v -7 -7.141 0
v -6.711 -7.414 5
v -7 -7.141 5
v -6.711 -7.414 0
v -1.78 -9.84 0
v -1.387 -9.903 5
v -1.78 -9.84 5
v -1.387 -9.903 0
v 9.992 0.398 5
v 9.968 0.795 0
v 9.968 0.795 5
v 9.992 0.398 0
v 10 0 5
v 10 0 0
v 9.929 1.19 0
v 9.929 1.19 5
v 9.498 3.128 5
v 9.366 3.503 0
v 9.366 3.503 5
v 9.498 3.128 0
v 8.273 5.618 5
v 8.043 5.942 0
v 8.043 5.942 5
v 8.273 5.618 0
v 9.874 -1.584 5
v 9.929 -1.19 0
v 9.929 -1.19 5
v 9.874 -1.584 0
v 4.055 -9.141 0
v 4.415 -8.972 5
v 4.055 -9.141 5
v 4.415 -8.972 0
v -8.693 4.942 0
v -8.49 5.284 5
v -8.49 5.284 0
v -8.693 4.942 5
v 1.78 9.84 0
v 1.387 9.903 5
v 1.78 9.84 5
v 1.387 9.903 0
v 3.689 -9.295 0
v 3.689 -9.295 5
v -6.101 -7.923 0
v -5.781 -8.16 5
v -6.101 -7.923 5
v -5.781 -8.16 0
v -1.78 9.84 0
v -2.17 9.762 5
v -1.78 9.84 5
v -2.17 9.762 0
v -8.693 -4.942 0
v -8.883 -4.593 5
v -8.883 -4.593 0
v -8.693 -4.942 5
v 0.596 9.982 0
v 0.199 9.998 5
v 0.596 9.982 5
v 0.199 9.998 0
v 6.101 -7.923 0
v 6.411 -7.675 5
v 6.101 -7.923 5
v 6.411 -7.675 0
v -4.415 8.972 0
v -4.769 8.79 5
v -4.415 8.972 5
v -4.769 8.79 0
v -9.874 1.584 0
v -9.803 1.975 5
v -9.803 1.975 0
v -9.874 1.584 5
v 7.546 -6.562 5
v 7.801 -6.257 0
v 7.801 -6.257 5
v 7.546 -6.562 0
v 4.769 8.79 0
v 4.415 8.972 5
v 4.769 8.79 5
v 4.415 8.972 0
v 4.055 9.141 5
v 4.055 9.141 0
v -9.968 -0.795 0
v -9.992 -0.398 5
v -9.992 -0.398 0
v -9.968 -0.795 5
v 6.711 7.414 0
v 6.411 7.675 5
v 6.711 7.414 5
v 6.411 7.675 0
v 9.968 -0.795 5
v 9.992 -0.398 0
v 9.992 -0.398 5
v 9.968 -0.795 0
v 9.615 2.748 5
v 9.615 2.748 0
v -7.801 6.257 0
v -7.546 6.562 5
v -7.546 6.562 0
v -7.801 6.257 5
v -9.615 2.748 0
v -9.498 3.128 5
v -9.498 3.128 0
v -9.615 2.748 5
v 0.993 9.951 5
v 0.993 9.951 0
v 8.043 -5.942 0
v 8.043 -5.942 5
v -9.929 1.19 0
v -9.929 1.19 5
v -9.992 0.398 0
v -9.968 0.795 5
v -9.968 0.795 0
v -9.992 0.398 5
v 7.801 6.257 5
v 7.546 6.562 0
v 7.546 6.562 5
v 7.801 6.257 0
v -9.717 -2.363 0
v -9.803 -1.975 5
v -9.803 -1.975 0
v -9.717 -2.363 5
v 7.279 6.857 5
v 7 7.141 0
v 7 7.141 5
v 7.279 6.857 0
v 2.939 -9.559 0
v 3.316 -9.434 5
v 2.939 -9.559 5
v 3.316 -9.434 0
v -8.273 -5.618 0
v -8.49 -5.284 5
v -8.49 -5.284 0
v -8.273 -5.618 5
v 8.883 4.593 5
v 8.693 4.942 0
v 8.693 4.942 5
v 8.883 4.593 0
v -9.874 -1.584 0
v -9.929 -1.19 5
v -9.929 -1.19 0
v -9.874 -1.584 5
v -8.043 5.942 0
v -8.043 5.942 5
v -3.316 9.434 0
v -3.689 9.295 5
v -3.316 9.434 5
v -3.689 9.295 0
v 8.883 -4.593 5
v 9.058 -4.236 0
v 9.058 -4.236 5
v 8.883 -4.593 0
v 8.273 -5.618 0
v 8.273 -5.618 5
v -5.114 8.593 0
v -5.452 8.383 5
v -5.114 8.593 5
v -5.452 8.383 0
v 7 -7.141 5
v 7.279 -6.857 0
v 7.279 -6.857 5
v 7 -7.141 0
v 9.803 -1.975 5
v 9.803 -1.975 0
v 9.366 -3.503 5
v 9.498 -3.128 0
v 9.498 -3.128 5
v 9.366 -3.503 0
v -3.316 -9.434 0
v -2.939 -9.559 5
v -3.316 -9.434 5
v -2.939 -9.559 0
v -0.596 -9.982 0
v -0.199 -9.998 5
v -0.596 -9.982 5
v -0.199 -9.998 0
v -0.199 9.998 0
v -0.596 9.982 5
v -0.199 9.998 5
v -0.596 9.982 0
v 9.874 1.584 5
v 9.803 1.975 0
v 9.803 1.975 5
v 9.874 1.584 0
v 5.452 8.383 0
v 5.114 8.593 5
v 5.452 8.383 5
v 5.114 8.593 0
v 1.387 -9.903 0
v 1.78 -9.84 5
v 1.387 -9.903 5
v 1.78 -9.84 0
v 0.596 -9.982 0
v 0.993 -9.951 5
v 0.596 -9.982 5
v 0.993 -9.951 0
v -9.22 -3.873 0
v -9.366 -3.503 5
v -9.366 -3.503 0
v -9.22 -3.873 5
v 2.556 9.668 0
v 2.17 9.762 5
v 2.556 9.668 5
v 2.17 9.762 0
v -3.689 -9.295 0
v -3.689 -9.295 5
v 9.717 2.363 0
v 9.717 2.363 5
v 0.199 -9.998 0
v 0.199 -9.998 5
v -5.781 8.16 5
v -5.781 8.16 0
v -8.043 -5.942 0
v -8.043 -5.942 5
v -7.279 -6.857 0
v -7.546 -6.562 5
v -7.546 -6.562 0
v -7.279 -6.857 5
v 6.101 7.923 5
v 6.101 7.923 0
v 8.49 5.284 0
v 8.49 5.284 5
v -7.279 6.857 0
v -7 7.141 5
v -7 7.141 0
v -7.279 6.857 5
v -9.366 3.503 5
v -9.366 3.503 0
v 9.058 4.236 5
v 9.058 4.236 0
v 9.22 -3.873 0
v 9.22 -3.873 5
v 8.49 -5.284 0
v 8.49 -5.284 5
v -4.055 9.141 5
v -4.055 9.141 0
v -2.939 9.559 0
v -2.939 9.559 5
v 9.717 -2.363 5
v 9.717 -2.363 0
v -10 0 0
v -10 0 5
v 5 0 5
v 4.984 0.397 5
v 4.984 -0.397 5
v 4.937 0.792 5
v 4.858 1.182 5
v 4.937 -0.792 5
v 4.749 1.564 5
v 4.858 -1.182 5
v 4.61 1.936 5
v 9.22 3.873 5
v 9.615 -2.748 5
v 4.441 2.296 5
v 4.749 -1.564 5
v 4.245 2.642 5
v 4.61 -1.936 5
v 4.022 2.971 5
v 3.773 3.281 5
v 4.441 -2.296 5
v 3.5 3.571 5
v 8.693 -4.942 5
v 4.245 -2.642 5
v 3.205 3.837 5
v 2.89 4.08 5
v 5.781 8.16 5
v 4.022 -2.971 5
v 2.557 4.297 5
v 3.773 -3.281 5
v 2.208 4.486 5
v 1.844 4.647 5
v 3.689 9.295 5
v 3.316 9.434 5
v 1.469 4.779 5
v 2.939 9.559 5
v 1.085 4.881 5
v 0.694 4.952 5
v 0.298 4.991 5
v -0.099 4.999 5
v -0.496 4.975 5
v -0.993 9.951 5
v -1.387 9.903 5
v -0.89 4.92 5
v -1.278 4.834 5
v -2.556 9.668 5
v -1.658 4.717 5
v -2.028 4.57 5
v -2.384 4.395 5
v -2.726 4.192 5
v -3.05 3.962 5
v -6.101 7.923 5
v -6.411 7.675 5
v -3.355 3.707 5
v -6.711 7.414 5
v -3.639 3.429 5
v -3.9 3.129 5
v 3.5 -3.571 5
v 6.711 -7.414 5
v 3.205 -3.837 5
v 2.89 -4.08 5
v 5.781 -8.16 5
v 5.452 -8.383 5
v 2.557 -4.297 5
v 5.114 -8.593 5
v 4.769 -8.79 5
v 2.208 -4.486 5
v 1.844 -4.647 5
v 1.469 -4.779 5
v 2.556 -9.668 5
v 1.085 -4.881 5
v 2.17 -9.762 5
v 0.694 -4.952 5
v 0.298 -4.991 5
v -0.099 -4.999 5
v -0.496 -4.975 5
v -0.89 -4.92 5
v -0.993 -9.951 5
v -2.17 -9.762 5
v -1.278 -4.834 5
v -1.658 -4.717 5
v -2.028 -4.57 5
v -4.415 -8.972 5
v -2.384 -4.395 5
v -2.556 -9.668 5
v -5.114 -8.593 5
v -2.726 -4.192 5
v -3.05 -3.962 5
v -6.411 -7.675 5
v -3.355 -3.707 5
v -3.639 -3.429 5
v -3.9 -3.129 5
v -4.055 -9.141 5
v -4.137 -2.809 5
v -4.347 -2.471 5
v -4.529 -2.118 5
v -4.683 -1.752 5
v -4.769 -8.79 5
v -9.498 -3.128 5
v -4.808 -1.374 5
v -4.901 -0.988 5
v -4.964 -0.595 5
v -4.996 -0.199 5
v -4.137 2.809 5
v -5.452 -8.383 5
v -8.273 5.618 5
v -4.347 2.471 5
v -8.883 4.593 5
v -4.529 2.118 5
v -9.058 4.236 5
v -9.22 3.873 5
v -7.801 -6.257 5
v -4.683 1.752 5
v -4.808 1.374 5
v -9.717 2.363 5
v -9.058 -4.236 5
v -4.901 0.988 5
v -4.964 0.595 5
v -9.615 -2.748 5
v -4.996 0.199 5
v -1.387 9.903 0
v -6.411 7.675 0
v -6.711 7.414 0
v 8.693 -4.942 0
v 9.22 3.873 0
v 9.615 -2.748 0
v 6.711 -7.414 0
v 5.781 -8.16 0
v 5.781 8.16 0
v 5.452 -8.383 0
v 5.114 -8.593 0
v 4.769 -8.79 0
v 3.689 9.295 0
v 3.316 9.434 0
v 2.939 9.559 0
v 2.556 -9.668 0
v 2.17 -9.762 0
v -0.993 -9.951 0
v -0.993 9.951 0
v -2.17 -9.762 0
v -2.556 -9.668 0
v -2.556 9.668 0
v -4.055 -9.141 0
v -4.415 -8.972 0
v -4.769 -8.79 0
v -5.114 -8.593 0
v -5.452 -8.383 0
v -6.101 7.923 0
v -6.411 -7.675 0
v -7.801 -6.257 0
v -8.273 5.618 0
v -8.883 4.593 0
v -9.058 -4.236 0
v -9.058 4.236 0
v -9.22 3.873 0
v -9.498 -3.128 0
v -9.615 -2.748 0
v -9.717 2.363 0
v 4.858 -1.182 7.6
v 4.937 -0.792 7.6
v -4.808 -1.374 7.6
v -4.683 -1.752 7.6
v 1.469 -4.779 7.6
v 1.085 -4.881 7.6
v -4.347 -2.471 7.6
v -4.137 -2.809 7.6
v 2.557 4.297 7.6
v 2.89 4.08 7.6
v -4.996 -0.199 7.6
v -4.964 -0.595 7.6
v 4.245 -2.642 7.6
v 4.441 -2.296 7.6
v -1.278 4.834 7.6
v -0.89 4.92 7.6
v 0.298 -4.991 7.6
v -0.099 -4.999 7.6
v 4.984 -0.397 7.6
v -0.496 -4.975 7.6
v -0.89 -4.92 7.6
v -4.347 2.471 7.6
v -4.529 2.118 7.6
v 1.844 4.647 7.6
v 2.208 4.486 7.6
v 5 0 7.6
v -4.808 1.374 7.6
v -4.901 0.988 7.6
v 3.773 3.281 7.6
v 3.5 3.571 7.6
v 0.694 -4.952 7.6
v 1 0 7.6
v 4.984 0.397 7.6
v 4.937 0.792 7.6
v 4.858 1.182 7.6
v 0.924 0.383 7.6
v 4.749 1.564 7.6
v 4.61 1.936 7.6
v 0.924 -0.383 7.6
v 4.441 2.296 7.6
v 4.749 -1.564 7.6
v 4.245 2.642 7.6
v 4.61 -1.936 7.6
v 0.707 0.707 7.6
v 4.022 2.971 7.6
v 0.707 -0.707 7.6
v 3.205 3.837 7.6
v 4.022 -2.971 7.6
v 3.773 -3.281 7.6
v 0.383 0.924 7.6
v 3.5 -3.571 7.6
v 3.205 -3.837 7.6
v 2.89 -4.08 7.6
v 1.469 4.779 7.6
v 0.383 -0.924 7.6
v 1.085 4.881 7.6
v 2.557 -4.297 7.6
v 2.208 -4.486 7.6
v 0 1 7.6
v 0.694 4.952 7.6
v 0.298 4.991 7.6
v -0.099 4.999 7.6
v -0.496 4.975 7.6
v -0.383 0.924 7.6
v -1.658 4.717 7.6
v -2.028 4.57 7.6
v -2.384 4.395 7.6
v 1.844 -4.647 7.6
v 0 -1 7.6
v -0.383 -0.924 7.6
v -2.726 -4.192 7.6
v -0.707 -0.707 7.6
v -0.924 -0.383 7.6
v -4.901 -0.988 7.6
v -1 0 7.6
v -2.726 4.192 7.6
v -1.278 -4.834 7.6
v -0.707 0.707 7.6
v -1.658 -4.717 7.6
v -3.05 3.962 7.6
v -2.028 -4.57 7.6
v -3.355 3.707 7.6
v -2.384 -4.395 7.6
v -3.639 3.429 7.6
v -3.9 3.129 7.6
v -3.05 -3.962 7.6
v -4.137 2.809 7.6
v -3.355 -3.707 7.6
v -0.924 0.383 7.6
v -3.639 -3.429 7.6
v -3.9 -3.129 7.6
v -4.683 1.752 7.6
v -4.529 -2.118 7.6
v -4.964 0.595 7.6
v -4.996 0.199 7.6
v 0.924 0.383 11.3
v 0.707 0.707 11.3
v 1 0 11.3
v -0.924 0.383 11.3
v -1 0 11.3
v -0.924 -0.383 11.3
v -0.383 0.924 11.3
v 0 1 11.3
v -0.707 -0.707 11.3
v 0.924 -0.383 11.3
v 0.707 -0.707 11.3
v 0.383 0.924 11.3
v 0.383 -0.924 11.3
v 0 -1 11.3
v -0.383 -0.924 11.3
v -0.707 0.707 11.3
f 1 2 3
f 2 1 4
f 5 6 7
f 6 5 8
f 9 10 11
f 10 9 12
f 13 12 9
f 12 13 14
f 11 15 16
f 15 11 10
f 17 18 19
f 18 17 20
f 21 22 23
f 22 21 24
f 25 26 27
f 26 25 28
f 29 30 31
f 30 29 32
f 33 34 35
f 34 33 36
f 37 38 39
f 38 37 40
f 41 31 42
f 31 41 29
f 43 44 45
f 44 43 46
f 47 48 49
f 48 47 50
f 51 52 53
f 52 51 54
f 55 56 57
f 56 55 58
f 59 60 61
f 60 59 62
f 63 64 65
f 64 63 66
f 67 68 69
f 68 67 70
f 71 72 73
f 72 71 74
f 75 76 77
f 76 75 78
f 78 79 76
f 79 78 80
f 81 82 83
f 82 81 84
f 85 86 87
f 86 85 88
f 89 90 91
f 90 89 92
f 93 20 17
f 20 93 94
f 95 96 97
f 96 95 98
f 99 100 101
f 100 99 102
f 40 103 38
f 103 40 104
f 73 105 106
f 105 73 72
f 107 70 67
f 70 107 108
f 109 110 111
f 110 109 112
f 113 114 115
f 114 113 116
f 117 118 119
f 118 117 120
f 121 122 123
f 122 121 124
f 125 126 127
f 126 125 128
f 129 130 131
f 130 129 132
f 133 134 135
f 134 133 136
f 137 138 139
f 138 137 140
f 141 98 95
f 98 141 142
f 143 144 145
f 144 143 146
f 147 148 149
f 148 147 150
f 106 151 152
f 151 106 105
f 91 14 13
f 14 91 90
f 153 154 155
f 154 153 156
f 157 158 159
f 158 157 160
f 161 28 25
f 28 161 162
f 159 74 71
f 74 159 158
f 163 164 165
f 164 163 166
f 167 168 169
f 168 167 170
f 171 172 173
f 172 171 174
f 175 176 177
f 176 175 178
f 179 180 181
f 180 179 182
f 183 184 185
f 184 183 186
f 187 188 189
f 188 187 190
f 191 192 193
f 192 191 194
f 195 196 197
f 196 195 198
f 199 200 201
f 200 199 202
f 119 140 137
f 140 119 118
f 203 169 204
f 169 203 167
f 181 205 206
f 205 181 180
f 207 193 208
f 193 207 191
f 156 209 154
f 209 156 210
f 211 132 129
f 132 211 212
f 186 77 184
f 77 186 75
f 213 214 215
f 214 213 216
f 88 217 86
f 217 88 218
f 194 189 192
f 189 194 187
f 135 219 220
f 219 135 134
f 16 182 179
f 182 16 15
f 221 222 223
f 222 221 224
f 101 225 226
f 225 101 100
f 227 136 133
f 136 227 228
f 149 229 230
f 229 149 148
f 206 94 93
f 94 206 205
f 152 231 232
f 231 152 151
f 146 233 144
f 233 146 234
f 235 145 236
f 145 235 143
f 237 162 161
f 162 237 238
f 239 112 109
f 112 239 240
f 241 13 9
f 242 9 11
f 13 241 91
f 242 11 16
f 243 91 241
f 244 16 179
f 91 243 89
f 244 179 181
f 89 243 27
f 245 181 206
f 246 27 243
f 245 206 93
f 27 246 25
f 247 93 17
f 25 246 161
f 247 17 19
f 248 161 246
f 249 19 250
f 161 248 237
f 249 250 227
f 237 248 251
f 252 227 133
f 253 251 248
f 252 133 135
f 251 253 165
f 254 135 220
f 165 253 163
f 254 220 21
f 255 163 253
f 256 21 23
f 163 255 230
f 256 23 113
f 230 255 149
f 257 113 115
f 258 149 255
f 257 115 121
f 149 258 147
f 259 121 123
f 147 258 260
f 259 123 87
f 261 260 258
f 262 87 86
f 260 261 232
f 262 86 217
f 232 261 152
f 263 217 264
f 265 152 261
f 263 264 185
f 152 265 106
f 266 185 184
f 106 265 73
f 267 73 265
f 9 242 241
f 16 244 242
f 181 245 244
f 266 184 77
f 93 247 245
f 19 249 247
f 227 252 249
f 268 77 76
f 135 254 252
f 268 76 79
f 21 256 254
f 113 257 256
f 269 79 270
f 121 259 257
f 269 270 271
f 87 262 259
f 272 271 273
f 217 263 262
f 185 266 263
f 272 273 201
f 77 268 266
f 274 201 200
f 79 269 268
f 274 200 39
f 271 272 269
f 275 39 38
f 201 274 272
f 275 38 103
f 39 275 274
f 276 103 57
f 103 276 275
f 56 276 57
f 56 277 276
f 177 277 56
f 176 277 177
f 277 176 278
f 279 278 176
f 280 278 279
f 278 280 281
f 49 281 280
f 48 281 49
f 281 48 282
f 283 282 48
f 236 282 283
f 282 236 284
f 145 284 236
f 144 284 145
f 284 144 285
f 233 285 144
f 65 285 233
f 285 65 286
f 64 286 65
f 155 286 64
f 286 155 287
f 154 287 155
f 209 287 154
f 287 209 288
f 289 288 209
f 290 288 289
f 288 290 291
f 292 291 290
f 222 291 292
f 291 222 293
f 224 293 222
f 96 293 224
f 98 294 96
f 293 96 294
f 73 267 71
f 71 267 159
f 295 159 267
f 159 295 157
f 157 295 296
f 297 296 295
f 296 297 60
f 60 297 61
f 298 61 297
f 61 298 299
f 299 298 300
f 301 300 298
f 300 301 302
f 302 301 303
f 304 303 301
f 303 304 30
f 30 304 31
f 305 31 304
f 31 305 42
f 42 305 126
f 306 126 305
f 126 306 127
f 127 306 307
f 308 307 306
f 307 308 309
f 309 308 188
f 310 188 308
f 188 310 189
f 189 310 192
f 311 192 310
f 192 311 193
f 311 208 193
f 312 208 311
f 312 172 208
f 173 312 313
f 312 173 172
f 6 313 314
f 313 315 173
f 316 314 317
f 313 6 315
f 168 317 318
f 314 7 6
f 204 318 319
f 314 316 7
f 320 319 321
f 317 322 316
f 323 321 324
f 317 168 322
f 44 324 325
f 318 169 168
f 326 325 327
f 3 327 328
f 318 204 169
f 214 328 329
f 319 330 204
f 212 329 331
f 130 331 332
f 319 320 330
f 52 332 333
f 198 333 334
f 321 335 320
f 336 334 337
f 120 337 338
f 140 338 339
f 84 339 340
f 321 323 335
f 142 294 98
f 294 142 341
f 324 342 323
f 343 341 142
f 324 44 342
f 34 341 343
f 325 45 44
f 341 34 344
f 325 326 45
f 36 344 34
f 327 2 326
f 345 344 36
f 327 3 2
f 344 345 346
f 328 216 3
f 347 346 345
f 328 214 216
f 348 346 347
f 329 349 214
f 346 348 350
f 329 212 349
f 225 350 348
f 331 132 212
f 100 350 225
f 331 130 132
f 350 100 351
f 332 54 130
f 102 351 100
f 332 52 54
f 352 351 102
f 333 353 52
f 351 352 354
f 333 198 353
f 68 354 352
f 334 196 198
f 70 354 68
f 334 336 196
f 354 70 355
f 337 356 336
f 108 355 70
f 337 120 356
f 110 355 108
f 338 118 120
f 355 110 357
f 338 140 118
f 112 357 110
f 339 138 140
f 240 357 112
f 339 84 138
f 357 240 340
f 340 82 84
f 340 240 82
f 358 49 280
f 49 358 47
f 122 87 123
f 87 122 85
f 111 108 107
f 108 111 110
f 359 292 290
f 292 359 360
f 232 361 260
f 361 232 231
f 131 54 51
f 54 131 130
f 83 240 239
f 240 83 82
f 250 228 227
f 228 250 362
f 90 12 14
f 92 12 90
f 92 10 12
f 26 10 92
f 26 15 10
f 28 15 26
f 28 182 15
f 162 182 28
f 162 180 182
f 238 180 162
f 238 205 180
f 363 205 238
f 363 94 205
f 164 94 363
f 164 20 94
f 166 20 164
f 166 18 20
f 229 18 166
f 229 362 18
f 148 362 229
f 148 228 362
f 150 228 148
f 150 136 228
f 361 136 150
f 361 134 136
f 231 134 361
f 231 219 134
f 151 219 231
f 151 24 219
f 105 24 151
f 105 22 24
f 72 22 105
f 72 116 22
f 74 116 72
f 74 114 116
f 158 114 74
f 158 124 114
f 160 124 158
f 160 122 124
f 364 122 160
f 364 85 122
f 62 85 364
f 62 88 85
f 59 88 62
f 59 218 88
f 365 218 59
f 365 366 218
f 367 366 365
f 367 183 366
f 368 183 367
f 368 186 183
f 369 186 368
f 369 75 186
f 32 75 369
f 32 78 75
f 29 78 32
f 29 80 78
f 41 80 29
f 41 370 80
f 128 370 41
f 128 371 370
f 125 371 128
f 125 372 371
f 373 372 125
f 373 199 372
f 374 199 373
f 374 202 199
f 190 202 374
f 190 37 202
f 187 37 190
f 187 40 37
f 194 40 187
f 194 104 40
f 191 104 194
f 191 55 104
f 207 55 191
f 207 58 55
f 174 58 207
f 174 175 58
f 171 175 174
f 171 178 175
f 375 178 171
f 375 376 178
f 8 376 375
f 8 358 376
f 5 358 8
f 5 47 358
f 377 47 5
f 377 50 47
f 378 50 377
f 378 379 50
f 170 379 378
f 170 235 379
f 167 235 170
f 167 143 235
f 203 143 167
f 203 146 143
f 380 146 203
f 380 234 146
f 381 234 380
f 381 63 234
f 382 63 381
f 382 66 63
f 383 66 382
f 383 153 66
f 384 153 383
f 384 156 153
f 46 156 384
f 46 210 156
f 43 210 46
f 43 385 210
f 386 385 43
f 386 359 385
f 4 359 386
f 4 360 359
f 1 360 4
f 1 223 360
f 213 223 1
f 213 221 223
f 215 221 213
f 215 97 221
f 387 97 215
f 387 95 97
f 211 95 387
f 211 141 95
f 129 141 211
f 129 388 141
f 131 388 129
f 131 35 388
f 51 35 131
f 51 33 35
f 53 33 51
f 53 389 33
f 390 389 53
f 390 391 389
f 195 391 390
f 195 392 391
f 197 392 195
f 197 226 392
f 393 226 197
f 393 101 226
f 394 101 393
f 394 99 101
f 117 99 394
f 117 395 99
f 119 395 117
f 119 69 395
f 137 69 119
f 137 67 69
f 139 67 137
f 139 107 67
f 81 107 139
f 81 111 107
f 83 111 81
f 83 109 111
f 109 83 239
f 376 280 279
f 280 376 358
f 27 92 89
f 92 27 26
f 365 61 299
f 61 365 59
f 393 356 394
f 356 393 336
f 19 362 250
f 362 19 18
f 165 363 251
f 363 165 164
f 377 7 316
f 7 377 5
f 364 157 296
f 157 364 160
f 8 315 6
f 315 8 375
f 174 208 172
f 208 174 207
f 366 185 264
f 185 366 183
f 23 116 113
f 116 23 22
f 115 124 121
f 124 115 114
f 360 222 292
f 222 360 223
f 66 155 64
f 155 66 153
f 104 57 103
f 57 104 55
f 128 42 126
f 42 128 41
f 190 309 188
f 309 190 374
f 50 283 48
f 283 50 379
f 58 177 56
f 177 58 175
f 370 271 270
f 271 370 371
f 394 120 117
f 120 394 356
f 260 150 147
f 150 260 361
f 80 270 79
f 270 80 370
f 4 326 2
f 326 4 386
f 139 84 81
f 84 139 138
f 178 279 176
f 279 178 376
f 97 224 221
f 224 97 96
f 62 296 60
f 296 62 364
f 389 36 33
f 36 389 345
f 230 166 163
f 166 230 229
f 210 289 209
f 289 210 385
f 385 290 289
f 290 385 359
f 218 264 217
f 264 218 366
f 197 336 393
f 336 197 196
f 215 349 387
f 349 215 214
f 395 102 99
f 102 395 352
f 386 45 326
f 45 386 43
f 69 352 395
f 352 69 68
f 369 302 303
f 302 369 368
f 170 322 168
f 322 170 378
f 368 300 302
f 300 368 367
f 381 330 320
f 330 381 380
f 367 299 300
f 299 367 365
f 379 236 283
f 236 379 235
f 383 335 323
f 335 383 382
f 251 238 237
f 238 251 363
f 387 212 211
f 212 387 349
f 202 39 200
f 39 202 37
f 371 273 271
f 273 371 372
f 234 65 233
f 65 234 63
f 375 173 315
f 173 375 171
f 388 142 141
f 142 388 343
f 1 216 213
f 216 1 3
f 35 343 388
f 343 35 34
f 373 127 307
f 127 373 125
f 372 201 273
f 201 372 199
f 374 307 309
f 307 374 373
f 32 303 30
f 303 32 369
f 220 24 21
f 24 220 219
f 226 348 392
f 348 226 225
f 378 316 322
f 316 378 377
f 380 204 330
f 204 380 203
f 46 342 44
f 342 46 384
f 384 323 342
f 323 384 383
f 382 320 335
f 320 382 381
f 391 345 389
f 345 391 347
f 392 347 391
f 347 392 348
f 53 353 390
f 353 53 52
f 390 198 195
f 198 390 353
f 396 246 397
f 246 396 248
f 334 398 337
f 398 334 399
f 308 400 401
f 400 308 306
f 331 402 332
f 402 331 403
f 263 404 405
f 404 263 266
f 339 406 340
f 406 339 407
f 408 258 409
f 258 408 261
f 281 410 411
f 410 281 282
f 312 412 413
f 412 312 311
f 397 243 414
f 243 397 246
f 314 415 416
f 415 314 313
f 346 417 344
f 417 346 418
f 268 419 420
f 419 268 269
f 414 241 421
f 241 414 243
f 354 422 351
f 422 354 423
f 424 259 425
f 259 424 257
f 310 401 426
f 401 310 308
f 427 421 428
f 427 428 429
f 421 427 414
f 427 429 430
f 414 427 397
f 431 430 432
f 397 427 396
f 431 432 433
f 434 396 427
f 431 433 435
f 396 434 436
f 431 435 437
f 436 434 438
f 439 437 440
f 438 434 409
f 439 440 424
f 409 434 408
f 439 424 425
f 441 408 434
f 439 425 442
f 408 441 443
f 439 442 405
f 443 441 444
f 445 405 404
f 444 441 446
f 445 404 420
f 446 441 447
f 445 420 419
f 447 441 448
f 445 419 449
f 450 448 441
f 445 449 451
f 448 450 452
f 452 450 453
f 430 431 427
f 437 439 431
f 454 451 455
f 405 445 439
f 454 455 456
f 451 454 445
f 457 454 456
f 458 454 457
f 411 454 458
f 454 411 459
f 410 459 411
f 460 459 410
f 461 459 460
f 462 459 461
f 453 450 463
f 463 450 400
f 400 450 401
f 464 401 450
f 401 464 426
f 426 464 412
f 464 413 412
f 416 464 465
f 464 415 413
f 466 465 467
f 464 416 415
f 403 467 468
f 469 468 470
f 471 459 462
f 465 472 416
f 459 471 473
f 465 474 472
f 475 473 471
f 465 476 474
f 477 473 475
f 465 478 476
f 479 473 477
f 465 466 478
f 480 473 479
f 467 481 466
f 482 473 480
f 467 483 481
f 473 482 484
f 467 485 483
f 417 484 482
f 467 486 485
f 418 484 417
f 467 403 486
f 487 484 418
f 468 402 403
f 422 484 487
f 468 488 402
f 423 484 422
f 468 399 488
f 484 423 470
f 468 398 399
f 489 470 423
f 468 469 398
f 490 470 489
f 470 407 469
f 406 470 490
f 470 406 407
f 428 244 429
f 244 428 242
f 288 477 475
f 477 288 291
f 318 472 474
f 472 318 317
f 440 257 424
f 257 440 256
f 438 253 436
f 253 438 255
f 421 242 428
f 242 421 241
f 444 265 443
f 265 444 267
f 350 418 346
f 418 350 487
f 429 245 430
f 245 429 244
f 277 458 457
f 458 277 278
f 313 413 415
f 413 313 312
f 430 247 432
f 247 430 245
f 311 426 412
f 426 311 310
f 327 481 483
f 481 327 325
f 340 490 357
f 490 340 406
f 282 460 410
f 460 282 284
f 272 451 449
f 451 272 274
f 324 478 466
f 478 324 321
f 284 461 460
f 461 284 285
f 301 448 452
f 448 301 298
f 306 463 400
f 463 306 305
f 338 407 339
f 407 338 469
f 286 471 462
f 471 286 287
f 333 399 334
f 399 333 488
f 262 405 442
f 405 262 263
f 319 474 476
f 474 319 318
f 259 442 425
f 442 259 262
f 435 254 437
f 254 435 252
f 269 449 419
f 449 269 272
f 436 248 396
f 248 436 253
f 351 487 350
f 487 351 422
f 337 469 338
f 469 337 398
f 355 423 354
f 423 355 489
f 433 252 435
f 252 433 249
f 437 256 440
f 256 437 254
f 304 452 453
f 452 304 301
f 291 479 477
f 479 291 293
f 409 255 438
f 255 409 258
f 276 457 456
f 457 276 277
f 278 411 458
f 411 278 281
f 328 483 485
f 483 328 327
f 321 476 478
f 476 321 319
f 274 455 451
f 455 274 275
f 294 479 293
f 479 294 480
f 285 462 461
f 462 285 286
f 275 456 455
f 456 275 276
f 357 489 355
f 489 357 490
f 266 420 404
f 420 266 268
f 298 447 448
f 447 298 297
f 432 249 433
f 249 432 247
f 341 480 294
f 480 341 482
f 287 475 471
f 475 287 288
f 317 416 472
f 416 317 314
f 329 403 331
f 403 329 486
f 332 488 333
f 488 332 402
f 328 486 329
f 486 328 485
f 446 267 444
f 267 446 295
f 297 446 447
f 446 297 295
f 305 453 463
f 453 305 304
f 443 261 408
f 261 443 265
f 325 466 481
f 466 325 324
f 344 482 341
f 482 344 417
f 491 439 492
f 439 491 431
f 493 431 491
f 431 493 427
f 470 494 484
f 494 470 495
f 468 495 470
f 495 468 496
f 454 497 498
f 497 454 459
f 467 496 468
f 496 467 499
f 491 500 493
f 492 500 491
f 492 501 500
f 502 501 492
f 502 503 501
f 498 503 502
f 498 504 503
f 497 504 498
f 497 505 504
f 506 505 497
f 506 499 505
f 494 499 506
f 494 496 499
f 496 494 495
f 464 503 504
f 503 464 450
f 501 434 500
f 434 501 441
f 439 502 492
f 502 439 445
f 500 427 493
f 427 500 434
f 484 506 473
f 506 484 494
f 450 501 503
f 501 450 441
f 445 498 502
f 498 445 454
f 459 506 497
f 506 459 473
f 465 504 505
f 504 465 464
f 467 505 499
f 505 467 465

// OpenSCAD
/*

    Usage:
    
    use <vector_cylinder.scad>
   
    module module_using_vector_cylinder() {
        C_A = 0 + 0;
        C_B = 1 + 0;
        C_C = 2 + 0;
        C_D = 3 + 0;
       
        d = 1;
        d_n = 2;
        d_b = 3;
        
        h_n = 3; 
        h_c = 3.3;
        h_s = 2;
        h_b = 2;

        colors =["aqua", "blue", "tomato"];

        columns = [vcf_r1_idx(), vcf_r2_idx(), vcf_h_idx(), vcf_color_idx()];

        axle_data = 
        [   
            [ d/2,      d_n/2,  h_n, C_A ], // Tapered outward section
            [ d_n/2,    d/2,    h_c, C_B ], // Tapered inward section 
            [ d/2,      d/2,    h_s, C_C ], // Straight section 
            [ d_b/2,    d_b/2,  h_b, C_D ], // Bigger and bad color index 
        ];  

        v_conic_frustrum(
            columns,         
            axle_data, 
            colors); 
    }

    module_using_vector_cylinder();
    

*/


/* [Boiler Plate] */

$fa = 1;
$fs = 0.4;
eps = 0.001;

infinity = 50;
 

/* [Test v_cylinder initial] */
show_initial_test_vci = true;

h_vci = [5, 2.6, 3.7];
r_vci = [10, 5, 1];
colors_vci = ["red", "yellow", "blue"];

/* [Test v_conic_frustrum] */
show_v_conic_frustrum_test_vcf = false;
test_data_columns_vcf = false;
show_v_conic_frustrum_test_data_columns_dc = false; 
colors_for_test_vcf = ["red", "blue", "green", "yellow"];
/* [Hidden] */
color_red_idx_vcf = 0;
color_blue_idx_vcf = 1;
color_green_idx_vcf = 2;
color_yellow_idx_vcf = 3;

/* [Test sample_pin] */
show_test_pin_tsp = false;

r_top_tsp = 5.11; 
r_top_inner_tsp = 4.11; 
r_neck_tsp = 3.65; 
r_base_inner_tsp = 5.11; 
r_base_tsp = 5.11;
h_total_tsp = 10.11; 
h_top_tsp = 2.11; 
h_base_tsp = 2.11;

/* [Test sample pin air gap ] */
show_test_sample_pin_air_gap_spag = false;

air_gap_spag = 0; // [0:0.1:5] 
test_piece_radius_by_rbase_spag = 2; // [0.9:0.1:5]
test_piece_handle_length_spag = 5; // [0:0.1:50]
red_spag = 128; // [10:255]
blue_spag = 128; // [10:255]
green_spag = 128; // [10:255]
alpha_spag = 0.5; // [0:0.1:1]


module hide_from_customizer(){}

show_name = false;
if (show_name) {
    linear_extrude(2) text("vector_cylinder.scad", halign="center");
}

// Cumulative sum of values in v
function cumsum(v) = [for (a = v[0]-v[0], i = 0; i < len(v); a = a+v[i], i = i+1) a+v[i]];
    
function vector_sum(v, i=0, r=0) = i<len(v) ? vector_sum(v, i+1, r+v[i]) : r;

function index_of(columns, idx_to_match, i=0) = 
    i == len(columns) ?
        undef :
        columns[i]==idx_to_match ? 
            i : 
            index_of(columns, idx_to_match, i + 1);


module v_cylinder(r, h, colors) {
    count = len(h);
    h_cum = cumsum(h);
    * echo("h_cum", h_cum);
    for(i = [0 : count-1]) {
        h_i = h[i];
        * echo("h_i", h_i);
        dz = i == 0 ? 0.0 :  h_cum[i-1];
        translate([0,0,dz]) 
        color(colors[i]) cylinder(r=r[i], h=h[i]);
    }
}

// Use functions to export constants
function vcf_r1_idx() = 0;
function vcf_r2_idx() = 1;
function vcf_h_idx() = 2;
function vcf_color_idx() = 3;

module v_conic_frustrum(data_columns, data, colors) {
    
    r1_idx = index_of(data_columns, vcf_r1_idx());
    r2_idx = index_of(data_columns, vcf_r2_idx());
    color_idx = index_of(data_columns, vcf_color_idx());
    h_idx = index_of(data_columns, vcf_h_idx());
    
    count = len(data);
    if (count == 0) {
        * echo("###################### Warning:  Data is empty in v_conic_frustrum");
    } else {
        h = [for (i = [0 : count-1]) data[i][h_idx] ];
        h_cum = cumsum(h);
        r1 = [for (i = [0 : count-1]) data[i][r1_idx]];
        r2 = [for (i = [0 : count-1]) data[i][r2_idx]];
        color_offset = [for (i = [0 : count-1]) data[i][color_idx]];
        for(i = [0 : count-1]) {
            h_i = h[i];
            // Make object slightly oversized for intersection goodness,
            // and nice previews 
            dz = (i == 0 ? 0.0 :  h_cum[i-1]) -eps ; 
            translate([0,0,dz]) 
            color(colors[color_offset[i]]) 
            cylinder(r1=r1[i], r2=r2[i], h=h[i] + 2 * eps);
        }  
    }  
}

if (show_initial_test_vci) {
    length = len(h_vci);
    list_2 = [ for (i = [0 : 1 : length-1]) i < 2 ? h_vci[i] : 0 ];
    * echo("list_2", list_2);
    
    sum = vector_sum(h_vci);
    * echo("vector_sum", sum, h_vci);
    * echo("cumsum", h_vci, cumsum(h_vci));
    v_cylinder(r=r_vci, h=h_vci, colors=colors_vci);
}


if (show_v_conic_frustrum_test_vcf) {
    columns = [vcf_r1_idx, vcf_r2_idx, vcf_h_idx, vcf_color_idx];
    conic_frustrum_test_data = [
        [4, 5, 3.3, color_blue_idx_vcf],
        [5, 2, 5.3, color_red_idx_vcf],
        [2, 2, 3.1, color_green_idx_vcf],
        [2, 2, 3.1, color_red_idx_vcf],
    ];
    
    * echo("conic_frustrum_test_data", conic_frustrum_test_data);
    element_0 = conic_frustrum_test_data[0];
    * echo("element_0", element_0);
    h0 = element_0[2];
    * echo("h0", h0);
    v_conic_frustrum(columns, conic_frustrum_test_data, colors_for_test_vcf);
}


if (show_v_conic_frustrum_test_data_columns_dc) {
    
    data_columns_changed = [vcf_color_idx, vcf_r1_idx, vcf_r2_idx, vcf_h_idx];
    conic_frustrum_test_data_changed_column_ordering = [
        [color_blue_idx_vcf,  4, 5, 3.3],
        [color_red_idx_vcf,   5, 2, 5.3],
        [color_green_idx_vcf, 2, 2, 3.1],
        [color_red_idx_vcf,   2, 2, 3.1],
    ];
    map = [1, 2, 3, 0];
    count = 4;
    * echo("color idx", map[vcf_color_idx]);
    * echo("r1 idx", map[vcf_r1_idx]);
    * echo("r2 idx", map[vcf_r2_idx]);
    * echo("h idx", map[vcf_h_idx]);
    * echo("data_column", data_columns_changed);
    * echo("map", map);
    * echo("vcf_h_idx", vcf_h_idx);
    
    map_trial = [
        index_of(data_columns_changed, 0),
        index_of(data_columns_changed, 1), 
        index_of(data_columns_changed, 2), 
        index_of(data_columns_changed, 3)]; 
    * echo("map_trial", map_trial);
    assert(is_undef(index_of(data_columns_changed, 99)));
    
    v_conic_frustrum(
        data_columns_changed, 
        conic_frustrum_test_data_changed_column_ordering, 
        colors_for_test_vcf);
    
}


module sample_pin(r_top, r_top_inner, r_neck, r_base_inner, r_base, h_total, h_top, h_base, air_gap=0) {
    
    // air_gap provides an ability to scale up the pin, to allow using intersection 
    // to generate a cavity for the pin.  Should help with print in place
    assert(!is_undef(r_top), "You must specify r_top");
    assert(!is_undef(r_top_inner), "You must specify r_top_inner");
    assert(!is_undef(r_neck), "You must specify r_neck");
    assert(!is_undef(r_base_inner), "You must specify r_base_inner");
    assert(!is_undef(r_base), "You must specify r_base");
    assert(!is_undef(h_total), "You must specify h_total");
    assert(!is_undef(h_top), "You must specify h_top");
    assert(!is_undef(h_base), "You must specify h_base");
    
    assert(air_gap >= 0, "air_gap must >= zero");
    
    function ag(r) = r + air_gap;
    
    columns = [vcf_r1_idx(), vcf_r2_idx(), vcf_h_idx(), vcf_color_idx()];
    h_neck = h_total - h_top - h_base;
    h_neck_bottom = h_neck/2;
    h_neck_top = h_neck/2;
    data = [
        [ag(r_base),        ag(r_base),         h_base,         color_blue_idx_vcf],
        [ag(r_base_inner),  ag(r_neck),         h_neck_bottom,  color_red_idx_vcf],
        [ag(r_neck),        ag(r_top_inner),    h_neck_top,     color_green_idx_vcf],
        [ag(r_top),         ag(r_top),          h_top,          color_yellow_idx_vcf],
    ];    
    v_conic_frustrum(
        columns, 
        data, 
        colors_for_test_vcf);
}


if (show_test_pin_tsp) {
    sample_pin(r_top_tsp, r_top_inner_tsp, r_neck_tsp, r_base_inner_tsp, r_base_tsp, h_total_tsp, h_top_tsp, h_base_tsp);
}


if (show_test_sample_pin_air_gap_spag) {
    sample_pin(
        r_top_tsp, r_top_inner_tsp, r_neck_tsp, r_base_inner_tsp, 
        r_base_tsp, h_total_tsp, h_top_tsp, h_base_tsp);

    test_piece_size = r_base_tsp*test_piece_radius_by_rbase_spag;
    color([red_spag/255, green_spag /255, blue_spag/255], alpha=alpha_spag) {
        difference() {
            cylinder(h=h_total_tsp, r=test_piece_size);
            sample_pin(
                r_top_tsp, r_top_inner_tsp, r_neck_tsp, r_base_inner_tsp, 
                r_base_tsp, h_total_tsp, h_top_tsp, h_base_tsp, air_gap=air_gap_spag);     
        }
    }
}
